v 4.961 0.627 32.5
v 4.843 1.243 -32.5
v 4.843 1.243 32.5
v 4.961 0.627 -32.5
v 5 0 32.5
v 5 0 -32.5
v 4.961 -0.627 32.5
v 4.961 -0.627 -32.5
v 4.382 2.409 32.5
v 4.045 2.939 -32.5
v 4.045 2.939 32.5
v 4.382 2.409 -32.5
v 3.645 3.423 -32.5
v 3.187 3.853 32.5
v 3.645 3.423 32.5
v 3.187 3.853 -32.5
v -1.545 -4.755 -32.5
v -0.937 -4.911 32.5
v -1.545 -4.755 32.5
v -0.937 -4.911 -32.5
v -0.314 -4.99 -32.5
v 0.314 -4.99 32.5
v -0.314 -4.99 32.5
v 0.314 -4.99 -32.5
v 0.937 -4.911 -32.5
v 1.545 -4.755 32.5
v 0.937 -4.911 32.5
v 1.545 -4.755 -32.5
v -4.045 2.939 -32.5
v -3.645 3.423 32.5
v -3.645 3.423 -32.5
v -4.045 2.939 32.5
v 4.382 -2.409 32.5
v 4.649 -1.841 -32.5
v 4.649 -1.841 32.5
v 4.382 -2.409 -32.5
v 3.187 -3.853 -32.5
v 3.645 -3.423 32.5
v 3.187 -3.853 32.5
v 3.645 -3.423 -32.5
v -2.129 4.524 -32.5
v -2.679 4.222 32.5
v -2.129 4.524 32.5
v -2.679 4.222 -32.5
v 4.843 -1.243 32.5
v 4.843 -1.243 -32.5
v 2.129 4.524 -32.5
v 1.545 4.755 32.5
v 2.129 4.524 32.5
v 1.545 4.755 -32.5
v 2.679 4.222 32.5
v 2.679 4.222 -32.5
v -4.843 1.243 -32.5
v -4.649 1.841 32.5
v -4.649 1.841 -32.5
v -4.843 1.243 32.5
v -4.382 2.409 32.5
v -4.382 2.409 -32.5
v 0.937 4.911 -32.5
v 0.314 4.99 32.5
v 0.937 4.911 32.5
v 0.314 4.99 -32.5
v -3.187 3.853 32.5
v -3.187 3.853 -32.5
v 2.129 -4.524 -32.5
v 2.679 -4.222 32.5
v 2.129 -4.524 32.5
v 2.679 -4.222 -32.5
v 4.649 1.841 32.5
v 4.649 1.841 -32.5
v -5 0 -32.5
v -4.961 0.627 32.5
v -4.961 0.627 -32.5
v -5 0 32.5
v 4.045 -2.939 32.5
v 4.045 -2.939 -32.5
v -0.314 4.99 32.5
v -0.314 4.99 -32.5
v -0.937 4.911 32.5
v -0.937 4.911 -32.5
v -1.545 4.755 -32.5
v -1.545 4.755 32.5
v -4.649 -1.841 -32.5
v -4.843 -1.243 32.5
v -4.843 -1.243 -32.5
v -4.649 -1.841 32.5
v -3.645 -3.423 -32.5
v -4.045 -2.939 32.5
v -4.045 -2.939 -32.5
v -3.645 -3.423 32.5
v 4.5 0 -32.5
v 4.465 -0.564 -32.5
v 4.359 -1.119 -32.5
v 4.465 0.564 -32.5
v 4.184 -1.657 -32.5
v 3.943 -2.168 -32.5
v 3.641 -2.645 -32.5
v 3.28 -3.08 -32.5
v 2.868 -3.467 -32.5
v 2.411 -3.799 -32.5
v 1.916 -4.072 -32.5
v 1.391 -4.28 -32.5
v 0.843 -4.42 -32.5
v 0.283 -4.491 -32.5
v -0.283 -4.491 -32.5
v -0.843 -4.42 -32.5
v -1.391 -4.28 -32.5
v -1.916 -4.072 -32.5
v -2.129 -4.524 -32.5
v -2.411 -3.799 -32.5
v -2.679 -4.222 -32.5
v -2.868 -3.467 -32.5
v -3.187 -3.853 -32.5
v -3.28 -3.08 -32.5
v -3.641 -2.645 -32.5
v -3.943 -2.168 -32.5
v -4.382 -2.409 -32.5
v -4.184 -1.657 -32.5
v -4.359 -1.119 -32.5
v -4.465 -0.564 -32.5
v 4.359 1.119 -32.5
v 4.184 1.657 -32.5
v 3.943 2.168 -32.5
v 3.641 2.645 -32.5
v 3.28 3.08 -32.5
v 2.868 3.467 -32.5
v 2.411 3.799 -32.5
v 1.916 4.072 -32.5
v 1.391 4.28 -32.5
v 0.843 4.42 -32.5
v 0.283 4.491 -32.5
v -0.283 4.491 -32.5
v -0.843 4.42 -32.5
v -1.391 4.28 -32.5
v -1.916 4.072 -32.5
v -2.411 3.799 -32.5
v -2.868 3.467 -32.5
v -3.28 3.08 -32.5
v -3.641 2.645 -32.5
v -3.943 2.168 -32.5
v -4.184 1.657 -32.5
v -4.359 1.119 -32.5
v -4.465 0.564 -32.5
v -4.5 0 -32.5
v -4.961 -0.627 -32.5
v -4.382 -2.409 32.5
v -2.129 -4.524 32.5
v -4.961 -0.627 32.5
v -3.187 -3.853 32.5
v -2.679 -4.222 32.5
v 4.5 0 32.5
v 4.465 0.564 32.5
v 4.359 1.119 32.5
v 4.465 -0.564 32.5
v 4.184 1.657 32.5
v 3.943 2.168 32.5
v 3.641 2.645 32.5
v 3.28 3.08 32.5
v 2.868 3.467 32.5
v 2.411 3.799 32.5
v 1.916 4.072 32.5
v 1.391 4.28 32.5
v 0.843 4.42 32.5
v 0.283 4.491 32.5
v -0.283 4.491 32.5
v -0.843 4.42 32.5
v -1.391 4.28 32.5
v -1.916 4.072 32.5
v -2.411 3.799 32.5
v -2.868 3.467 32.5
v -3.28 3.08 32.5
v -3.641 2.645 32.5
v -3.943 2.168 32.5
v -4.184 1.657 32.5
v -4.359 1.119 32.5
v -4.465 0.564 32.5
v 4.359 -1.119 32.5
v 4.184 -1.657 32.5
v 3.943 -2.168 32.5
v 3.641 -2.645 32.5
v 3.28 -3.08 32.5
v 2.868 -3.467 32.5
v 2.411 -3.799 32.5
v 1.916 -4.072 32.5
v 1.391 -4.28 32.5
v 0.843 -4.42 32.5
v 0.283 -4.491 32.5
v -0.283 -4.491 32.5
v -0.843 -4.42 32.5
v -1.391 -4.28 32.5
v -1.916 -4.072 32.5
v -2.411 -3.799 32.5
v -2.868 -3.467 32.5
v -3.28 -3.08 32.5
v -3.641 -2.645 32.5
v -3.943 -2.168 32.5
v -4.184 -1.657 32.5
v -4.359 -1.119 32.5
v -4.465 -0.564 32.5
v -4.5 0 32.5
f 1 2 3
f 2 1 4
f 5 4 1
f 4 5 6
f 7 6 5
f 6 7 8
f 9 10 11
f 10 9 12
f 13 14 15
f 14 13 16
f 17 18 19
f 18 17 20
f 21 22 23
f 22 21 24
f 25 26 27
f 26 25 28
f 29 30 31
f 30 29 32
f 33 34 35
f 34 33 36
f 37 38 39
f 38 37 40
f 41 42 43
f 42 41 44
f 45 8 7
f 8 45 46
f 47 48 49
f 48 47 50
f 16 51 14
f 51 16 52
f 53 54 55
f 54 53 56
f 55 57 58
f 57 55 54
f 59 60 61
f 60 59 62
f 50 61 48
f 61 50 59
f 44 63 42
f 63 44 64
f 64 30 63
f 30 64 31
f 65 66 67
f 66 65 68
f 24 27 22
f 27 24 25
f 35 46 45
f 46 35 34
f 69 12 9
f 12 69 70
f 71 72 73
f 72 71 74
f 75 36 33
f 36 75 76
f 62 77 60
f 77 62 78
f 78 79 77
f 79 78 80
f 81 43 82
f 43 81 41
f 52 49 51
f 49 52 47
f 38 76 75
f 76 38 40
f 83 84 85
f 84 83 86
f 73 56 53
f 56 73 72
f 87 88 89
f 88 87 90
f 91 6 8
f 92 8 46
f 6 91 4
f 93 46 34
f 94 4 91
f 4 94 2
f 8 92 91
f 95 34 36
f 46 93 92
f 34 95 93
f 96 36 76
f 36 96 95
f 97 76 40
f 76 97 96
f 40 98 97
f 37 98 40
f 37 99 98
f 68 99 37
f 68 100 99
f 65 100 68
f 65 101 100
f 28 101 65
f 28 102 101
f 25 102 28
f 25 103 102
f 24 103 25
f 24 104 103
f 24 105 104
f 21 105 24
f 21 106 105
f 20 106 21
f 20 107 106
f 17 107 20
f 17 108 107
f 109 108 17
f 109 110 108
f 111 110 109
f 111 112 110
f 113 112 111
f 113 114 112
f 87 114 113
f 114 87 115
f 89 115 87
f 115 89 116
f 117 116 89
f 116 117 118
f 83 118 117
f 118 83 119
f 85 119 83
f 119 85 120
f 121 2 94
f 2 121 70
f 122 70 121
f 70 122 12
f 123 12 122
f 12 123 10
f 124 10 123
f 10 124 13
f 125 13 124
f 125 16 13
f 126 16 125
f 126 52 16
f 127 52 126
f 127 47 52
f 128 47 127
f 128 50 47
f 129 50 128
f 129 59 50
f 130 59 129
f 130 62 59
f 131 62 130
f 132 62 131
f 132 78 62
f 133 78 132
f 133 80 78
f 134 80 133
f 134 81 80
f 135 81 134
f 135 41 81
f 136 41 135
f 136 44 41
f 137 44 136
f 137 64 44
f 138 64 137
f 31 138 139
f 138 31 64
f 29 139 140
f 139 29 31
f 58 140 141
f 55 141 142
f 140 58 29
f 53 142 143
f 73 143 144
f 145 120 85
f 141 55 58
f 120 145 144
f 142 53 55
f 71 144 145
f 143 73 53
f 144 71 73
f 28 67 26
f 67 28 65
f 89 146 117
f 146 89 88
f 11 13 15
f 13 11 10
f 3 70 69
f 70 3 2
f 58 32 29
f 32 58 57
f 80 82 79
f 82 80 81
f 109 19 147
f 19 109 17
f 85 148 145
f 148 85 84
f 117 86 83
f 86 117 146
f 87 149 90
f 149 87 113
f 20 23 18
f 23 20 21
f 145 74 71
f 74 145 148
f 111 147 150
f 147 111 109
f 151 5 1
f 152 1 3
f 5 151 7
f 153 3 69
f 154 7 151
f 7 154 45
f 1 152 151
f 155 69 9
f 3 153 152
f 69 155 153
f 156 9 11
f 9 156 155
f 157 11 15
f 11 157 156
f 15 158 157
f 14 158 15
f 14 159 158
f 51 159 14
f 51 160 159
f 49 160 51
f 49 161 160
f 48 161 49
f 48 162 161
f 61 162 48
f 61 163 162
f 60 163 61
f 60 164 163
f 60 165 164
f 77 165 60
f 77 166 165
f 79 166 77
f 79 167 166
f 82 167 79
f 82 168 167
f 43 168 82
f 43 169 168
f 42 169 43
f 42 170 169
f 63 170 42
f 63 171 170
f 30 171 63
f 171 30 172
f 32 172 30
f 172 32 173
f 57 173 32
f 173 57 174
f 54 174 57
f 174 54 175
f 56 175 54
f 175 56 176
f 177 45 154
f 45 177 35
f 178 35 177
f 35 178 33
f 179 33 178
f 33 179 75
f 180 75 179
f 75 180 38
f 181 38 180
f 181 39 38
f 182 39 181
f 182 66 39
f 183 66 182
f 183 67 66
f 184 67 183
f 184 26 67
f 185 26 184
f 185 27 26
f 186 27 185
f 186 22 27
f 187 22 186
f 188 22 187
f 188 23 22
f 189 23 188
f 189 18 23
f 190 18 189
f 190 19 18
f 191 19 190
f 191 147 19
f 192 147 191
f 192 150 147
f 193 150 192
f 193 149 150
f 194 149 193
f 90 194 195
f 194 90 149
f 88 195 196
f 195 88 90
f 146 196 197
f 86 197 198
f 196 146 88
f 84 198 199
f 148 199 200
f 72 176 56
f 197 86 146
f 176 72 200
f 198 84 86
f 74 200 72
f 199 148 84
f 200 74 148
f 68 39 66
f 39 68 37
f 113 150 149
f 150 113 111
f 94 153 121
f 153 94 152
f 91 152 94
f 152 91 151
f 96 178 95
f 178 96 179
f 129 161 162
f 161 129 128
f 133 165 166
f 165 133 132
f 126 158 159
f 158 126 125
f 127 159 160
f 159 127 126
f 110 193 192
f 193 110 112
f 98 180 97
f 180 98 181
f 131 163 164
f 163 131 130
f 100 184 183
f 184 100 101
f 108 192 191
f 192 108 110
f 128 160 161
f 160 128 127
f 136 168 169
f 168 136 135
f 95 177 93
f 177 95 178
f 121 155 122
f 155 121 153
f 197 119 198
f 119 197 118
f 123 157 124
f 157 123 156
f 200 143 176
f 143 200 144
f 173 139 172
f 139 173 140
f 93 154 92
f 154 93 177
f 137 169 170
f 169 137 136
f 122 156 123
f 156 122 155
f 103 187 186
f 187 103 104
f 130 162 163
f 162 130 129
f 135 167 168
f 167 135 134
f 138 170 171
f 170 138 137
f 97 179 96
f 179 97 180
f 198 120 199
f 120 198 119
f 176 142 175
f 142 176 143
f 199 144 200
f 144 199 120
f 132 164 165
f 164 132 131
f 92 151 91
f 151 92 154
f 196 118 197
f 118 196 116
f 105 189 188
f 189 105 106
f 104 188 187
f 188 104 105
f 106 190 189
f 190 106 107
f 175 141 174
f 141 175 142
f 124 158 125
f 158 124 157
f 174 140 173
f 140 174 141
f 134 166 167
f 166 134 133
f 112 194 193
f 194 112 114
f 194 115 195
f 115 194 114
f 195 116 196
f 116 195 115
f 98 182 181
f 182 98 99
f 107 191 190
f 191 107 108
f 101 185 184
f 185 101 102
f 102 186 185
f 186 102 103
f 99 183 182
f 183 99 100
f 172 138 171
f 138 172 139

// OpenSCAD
$fn = 50;


difference() {
	union() {
		translate(v = [0, 0, -32.5000000000]) {
			cylinder(h = 65, r = 5.0000000000);
		}
	}
	union() {
		translate(v = [0, 0, -100.0000000000]) {
			cylinder(h = 200, r = 4.5000000000);
		}
	}
}
